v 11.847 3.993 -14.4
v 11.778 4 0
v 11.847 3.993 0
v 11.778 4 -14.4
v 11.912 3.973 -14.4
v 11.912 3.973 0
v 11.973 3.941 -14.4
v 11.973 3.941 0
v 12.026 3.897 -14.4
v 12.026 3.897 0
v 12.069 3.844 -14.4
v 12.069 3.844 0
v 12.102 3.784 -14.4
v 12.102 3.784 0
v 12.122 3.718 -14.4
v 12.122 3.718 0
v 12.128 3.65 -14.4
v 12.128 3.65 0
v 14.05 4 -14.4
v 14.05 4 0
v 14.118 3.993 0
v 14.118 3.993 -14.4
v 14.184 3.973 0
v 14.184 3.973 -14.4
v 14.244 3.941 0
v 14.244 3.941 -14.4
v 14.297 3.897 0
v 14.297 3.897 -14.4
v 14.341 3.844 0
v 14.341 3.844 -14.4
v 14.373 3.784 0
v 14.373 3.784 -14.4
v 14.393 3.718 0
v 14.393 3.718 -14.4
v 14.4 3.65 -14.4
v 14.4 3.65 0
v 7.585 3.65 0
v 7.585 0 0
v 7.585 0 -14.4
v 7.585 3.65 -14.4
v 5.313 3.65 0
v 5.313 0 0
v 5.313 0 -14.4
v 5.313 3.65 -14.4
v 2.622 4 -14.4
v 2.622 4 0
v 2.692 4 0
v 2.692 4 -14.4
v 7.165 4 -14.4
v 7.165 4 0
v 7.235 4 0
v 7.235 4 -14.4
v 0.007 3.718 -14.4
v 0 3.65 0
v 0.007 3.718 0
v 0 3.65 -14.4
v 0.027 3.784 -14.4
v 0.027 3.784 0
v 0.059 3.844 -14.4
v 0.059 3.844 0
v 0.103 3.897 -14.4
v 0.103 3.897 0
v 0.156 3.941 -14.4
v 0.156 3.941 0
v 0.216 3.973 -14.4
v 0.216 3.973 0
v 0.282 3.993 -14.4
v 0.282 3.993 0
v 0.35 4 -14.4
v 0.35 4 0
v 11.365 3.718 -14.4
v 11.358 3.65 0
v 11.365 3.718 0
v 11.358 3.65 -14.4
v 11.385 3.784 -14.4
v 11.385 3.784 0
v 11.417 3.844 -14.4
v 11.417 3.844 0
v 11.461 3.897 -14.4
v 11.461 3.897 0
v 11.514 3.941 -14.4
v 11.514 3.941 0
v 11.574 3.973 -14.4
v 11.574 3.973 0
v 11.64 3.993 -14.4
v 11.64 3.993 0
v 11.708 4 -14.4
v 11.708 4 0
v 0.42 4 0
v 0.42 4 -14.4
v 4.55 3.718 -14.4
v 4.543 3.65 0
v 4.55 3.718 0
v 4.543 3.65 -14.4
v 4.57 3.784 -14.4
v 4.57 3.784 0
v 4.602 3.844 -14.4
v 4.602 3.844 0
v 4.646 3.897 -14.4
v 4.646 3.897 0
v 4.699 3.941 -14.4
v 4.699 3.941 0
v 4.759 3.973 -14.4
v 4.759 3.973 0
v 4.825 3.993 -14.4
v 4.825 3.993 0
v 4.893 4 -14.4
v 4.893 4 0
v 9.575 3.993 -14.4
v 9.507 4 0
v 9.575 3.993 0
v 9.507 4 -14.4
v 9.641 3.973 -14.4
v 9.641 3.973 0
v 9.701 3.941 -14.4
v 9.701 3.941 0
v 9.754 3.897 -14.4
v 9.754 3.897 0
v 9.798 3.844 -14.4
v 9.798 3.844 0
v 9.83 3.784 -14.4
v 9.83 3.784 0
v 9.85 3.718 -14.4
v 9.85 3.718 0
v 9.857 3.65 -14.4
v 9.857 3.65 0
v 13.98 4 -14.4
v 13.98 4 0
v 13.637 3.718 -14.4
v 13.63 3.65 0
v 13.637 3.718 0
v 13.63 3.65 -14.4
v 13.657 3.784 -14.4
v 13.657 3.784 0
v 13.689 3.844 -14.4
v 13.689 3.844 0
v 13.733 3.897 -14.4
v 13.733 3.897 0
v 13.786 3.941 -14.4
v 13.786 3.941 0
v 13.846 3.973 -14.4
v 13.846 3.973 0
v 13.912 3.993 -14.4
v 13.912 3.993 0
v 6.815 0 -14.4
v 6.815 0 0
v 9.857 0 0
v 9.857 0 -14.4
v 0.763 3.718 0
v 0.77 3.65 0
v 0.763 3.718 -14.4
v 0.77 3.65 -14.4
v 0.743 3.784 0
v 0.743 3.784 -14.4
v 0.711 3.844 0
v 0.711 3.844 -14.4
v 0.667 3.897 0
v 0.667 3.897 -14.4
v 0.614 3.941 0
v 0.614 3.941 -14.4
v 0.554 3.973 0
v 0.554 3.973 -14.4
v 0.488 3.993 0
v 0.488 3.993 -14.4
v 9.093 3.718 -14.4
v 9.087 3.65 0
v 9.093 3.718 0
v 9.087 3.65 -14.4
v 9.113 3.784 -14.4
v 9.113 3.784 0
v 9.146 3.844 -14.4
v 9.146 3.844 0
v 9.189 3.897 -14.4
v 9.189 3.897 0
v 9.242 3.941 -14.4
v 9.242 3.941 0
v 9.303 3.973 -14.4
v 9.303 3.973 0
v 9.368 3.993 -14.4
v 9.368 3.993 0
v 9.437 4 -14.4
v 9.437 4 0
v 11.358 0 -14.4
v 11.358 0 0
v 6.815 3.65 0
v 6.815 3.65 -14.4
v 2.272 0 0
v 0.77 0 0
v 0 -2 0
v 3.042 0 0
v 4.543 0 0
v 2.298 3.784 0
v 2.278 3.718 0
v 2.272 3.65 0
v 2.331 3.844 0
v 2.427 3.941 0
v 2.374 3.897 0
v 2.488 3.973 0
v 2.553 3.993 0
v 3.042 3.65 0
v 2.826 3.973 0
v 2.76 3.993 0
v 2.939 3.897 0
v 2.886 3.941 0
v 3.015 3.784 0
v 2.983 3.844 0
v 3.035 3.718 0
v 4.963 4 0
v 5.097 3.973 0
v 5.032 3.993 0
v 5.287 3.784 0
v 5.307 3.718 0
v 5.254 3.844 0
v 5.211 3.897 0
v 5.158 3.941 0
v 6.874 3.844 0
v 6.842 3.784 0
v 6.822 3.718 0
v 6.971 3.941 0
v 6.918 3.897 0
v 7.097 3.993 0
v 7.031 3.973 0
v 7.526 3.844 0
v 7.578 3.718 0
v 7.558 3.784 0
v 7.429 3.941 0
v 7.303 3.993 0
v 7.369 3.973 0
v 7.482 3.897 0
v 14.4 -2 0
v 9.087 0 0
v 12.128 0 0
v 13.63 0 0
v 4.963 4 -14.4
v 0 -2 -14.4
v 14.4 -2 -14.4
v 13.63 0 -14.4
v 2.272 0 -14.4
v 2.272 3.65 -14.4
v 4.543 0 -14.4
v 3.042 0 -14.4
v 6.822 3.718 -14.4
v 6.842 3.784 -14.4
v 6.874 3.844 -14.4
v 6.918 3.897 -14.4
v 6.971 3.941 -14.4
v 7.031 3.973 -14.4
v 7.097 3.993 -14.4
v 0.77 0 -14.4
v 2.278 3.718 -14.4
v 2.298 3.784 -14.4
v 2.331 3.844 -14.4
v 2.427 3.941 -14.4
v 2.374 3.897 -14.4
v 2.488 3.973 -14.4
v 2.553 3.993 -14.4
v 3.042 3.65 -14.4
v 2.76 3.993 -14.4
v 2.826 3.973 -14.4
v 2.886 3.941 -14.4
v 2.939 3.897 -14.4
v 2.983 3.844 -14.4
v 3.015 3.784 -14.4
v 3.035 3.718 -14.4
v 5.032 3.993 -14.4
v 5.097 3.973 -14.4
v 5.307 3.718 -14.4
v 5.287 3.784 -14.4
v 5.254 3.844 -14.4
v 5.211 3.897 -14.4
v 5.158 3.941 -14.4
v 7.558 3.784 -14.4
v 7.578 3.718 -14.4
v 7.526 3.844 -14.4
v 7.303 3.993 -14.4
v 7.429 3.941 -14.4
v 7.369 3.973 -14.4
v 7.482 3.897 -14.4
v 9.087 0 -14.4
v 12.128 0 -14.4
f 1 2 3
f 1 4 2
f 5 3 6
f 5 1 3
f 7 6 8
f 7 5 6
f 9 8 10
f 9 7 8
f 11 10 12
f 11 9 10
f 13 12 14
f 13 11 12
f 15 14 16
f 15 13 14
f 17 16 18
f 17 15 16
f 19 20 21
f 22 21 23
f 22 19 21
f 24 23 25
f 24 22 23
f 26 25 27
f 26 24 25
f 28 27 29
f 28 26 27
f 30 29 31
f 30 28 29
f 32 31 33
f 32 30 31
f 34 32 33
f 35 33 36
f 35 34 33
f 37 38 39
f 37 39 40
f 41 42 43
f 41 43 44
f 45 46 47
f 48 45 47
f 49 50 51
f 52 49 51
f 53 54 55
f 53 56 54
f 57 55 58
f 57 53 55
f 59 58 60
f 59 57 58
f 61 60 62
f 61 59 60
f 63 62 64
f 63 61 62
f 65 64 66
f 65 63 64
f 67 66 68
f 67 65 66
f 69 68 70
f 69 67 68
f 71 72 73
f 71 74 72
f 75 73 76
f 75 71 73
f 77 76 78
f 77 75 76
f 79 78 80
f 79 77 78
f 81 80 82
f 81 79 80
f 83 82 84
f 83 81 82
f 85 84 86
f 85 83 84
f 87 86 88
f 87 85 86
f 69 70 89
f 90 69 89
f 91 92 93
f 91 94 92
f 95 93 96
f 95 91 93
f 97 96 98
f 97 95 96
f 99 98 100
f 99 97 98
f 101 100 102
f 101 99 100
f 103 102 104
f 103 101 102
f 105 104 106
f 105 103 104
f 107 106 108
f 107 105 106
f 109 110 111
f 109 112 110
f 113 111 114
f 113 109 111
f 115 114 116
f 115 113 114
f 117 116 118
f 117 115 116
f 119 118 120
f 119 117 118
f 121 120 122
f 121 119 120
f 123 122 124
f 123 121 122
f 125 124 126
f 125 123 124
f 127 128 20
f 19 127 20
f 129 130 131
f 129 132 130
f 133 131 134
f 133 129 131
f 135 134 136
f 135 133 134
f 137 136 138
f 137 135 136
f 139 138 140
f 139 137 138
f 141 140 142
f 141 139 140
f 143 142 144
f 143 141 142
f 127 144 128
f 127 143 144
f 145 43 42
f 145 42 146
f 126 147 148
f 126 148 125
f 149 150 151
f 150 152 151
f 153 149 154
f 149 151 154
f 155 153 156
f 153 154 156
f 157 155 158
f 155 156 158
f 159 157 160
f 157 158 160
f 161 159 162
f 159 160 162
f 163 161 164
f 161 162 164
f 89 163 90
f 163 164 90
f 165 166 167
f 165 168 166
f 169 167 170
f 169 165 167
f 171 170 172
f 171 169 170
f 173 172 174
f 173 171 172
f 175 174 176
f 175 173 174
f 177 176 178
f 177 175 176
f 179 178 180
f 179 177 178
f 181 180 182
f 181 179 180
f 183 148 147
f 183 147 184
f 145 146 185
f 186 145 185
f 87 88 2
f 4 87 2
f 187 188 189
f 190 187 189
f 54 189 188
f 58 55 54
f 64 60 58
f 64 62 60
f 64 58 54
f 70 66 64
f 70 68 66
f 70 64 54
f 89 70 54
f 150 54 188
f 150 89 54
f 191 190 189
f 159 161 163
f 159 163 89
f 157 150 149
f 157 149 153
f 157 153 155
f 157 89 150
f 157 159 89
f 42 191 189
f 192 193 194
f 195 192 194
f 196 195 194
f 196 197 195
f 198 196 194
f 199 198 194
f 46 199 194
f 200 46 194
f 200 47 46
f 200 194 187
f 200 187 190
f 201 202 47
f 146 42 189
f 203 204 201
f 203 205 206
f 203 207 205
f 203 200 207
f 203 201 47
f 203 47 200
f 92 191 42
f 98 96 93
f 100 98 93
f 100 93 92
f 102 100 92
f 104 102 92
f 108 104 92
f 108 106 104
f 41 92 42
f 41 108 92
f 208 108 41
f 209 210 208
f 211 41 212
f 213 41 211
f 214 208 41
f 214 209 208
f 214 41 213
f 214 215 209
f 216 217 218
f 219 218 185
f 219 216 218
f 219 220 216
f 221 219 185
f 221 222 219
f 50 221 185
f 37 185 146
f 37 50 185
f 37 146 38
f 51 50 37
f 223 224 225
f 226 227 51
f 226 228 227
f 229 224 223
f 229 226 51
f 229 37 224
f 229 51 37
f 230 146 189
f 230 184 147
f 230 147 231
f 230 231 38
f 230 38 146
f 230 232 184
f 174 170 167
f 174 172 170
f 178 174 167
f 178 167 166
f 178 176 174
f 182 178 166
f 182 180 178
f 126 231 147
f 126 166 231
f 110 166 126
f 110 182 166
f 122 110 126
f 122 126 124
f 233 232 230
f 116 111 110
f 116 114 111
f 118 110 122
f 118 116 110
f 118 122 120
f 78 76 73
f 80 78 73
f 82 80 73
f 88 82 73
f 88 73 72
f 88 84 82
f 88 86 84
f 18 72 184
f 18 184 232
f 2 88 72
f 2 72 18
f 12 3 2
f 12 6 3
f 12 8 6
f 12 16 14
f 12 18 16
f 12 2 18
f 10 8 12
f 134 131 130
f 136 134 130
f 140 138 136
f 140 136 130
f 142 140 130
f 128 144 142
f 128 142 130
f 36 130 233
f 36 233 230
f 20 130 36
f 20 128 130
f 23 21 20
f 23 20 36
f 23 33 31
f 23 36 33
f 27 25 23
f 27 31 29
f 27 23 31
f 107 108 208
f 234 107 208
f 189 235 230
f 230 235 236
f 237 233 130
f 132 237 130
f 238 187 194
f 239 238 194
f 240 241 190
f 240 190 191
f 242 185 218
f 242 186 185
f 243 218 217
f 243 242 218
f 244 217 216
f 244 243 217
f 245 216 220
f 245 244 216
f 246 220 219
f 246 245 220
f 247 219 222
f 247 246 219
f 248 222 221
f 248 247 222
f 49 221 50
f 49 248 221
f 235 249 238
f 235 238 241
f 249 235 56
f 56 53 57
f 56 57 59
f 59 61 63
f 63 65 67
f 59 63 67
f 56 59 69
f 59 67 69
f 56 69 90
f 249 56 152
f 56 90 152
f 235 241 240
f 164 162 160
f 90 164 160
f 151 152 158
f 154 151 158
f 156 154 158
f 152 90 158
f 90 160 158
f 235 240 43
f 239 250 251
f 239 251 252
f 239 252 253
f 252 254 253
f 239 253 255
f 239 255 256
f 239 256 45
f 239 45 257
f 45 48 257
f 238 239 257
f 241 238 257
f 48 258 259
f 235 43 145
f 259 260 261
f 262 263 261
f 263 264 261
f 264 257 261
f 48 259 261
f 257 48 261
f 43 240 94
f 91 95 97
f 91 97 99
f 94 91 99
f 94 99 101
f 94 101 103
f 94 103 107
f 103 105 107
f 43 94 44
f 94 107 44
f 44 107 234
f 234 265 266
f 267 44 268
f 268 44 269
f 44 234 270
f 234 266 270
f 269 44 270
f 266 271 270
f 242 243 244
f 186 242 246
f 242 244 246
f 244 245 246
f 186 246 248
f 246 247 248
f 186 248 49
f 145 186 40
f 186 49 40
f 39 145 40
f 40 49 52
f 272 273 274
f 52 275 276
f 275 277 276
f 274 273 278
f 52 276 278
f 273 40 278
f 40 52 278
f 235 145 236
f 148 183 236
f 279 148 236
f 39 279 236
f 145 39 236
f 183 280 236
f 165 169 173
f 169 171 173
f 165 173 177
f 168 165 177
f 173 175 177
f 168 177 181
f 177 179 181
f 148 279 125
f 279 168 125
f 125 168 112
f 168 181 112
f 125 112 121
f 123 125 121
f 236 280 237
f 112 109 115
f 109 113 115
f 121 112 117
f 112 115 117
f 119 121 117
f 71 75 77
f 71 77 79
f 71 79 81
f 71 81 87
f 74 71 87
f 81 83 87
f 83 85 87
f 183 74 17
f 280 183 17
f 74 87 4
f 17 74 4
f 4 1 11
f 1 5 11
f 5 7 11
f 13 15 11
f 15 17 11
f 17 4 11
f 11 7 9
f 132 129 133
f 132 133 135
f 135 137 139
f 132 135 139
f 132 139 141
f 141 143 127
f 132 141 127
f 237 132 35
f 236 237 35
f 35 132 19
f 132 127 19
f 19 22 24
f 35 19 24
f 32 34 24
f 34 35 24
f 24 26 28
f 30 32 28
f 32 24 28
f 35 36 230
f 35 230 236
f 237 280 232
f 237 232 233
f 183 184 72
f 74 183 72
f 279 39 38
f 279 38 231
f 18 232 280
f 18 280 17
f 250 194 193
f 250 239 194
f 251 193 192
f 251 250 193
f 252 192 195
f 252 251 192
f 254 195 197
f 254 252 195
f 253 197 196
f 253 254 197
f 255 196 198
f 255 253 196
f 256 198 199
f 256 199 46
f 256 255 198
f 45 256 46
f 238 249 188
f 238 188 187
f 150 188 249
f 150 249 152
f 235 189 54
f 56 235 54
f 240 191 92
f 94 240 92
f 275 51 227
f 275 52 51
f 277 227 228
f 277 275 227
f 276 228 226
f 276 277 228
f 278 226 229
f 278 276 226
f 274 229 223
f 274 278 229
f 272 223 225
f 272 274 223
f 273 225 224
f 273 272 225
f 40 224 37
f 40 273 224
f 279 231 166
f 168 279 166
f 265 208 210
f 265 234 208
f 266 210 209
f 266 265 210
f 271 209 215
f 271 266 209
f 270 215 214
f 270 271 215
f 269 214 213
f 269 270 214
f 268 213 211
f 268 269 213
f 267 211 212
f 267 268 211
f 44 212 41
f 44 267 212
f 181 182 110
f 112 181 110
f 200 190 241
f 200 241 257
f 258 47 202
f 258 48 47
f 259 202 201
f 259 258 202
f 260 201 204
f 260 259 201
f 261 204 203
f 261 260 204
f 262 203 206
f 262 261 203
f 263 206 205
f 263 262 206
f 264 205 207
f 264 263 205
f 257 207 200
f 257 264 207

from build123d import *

# Parameters (mm, degrees)
SKETCH1_W           = 14.4
SKETCH1_H           = 14.4
BOSS_EXTRUDE1_DEPTH = 2
SKETCH2_W           = 0.77
SKETCH2_H           = 4
BOSS_EXTRUDE2_DEPTH = 14.4
FILLET1_R           = 0.35


with BuildPart() as part:
    # Sketch1 → Boss-Extrude1 (new body)
    with BuildSketch(Plane(origin=(0, 0, 0), x_dir=(1, 0, 0), z_dir=(0, 1, 0))):
        with Locations((7.2, 7.2)):
            Rectangle(SKETCH1_W, SKETCH1_H)
    extrude(amount=-BOSS_EXTRUDE1_DEPTH)

    # Sketch2 → Boss-Extrude2 (add)
    with BuildSketch(Plane.XY):
        with Locations((2.656666667, 2)):
            Rectangle(SKETCH2_W, SKETCH2_H)
        with Locations((0.385, 2)):
            Rectangle(SKETCH2_W, SKETCH2_H)
        with Locations((4.928333333, 2)):
            Rectangle(SKETCH2_W, SKETCH2_H)
        with Locations((7.2, 2)):
            Rectangle(SKETCH2_W, SKETCH2_H)
        with Locations((9.471666667, 2)):
            Rectangle(SKETCH2_W, SKETCH2_H)
        with Locations((11.743333333, 2)):
            Rectangle(SKETCH2_W, SKETCH2_H)
        with Locations((14.015, 2)):
            Rectangle(SKETCH2_W, SKETCH2_H)
    extrude(amount=-BOSS_EXTRUDE2_DEPTH)

    # Fillet1
    fillet1_edges = [part.edges().sort_by_distance(p)[0] for p in [
        (0.77, 4, -7.2),
        (0, 4, -7.2),
        (3.041666667, 4, -7.2),
        (2.271666667, 4, -7.2),
        (5.313333333, 4, -7.2),
        (4.543333333, 4, -7.2),
        (7.585, 4, -7.2),
        (6.815, 4, -7.2),
        (9.856666667, 4, -7.2),
        (9.086666667, 4, -7.2),
        (12.128333333, 4, -7.2),
        (11.358333333, 4, -7.2),
        (14.4, 4, -7.2),
        (13.63, 4, -7.2),
    ]]
    fillet(fillet1_edges, radius=FILLET1_R)


solid = part.part
